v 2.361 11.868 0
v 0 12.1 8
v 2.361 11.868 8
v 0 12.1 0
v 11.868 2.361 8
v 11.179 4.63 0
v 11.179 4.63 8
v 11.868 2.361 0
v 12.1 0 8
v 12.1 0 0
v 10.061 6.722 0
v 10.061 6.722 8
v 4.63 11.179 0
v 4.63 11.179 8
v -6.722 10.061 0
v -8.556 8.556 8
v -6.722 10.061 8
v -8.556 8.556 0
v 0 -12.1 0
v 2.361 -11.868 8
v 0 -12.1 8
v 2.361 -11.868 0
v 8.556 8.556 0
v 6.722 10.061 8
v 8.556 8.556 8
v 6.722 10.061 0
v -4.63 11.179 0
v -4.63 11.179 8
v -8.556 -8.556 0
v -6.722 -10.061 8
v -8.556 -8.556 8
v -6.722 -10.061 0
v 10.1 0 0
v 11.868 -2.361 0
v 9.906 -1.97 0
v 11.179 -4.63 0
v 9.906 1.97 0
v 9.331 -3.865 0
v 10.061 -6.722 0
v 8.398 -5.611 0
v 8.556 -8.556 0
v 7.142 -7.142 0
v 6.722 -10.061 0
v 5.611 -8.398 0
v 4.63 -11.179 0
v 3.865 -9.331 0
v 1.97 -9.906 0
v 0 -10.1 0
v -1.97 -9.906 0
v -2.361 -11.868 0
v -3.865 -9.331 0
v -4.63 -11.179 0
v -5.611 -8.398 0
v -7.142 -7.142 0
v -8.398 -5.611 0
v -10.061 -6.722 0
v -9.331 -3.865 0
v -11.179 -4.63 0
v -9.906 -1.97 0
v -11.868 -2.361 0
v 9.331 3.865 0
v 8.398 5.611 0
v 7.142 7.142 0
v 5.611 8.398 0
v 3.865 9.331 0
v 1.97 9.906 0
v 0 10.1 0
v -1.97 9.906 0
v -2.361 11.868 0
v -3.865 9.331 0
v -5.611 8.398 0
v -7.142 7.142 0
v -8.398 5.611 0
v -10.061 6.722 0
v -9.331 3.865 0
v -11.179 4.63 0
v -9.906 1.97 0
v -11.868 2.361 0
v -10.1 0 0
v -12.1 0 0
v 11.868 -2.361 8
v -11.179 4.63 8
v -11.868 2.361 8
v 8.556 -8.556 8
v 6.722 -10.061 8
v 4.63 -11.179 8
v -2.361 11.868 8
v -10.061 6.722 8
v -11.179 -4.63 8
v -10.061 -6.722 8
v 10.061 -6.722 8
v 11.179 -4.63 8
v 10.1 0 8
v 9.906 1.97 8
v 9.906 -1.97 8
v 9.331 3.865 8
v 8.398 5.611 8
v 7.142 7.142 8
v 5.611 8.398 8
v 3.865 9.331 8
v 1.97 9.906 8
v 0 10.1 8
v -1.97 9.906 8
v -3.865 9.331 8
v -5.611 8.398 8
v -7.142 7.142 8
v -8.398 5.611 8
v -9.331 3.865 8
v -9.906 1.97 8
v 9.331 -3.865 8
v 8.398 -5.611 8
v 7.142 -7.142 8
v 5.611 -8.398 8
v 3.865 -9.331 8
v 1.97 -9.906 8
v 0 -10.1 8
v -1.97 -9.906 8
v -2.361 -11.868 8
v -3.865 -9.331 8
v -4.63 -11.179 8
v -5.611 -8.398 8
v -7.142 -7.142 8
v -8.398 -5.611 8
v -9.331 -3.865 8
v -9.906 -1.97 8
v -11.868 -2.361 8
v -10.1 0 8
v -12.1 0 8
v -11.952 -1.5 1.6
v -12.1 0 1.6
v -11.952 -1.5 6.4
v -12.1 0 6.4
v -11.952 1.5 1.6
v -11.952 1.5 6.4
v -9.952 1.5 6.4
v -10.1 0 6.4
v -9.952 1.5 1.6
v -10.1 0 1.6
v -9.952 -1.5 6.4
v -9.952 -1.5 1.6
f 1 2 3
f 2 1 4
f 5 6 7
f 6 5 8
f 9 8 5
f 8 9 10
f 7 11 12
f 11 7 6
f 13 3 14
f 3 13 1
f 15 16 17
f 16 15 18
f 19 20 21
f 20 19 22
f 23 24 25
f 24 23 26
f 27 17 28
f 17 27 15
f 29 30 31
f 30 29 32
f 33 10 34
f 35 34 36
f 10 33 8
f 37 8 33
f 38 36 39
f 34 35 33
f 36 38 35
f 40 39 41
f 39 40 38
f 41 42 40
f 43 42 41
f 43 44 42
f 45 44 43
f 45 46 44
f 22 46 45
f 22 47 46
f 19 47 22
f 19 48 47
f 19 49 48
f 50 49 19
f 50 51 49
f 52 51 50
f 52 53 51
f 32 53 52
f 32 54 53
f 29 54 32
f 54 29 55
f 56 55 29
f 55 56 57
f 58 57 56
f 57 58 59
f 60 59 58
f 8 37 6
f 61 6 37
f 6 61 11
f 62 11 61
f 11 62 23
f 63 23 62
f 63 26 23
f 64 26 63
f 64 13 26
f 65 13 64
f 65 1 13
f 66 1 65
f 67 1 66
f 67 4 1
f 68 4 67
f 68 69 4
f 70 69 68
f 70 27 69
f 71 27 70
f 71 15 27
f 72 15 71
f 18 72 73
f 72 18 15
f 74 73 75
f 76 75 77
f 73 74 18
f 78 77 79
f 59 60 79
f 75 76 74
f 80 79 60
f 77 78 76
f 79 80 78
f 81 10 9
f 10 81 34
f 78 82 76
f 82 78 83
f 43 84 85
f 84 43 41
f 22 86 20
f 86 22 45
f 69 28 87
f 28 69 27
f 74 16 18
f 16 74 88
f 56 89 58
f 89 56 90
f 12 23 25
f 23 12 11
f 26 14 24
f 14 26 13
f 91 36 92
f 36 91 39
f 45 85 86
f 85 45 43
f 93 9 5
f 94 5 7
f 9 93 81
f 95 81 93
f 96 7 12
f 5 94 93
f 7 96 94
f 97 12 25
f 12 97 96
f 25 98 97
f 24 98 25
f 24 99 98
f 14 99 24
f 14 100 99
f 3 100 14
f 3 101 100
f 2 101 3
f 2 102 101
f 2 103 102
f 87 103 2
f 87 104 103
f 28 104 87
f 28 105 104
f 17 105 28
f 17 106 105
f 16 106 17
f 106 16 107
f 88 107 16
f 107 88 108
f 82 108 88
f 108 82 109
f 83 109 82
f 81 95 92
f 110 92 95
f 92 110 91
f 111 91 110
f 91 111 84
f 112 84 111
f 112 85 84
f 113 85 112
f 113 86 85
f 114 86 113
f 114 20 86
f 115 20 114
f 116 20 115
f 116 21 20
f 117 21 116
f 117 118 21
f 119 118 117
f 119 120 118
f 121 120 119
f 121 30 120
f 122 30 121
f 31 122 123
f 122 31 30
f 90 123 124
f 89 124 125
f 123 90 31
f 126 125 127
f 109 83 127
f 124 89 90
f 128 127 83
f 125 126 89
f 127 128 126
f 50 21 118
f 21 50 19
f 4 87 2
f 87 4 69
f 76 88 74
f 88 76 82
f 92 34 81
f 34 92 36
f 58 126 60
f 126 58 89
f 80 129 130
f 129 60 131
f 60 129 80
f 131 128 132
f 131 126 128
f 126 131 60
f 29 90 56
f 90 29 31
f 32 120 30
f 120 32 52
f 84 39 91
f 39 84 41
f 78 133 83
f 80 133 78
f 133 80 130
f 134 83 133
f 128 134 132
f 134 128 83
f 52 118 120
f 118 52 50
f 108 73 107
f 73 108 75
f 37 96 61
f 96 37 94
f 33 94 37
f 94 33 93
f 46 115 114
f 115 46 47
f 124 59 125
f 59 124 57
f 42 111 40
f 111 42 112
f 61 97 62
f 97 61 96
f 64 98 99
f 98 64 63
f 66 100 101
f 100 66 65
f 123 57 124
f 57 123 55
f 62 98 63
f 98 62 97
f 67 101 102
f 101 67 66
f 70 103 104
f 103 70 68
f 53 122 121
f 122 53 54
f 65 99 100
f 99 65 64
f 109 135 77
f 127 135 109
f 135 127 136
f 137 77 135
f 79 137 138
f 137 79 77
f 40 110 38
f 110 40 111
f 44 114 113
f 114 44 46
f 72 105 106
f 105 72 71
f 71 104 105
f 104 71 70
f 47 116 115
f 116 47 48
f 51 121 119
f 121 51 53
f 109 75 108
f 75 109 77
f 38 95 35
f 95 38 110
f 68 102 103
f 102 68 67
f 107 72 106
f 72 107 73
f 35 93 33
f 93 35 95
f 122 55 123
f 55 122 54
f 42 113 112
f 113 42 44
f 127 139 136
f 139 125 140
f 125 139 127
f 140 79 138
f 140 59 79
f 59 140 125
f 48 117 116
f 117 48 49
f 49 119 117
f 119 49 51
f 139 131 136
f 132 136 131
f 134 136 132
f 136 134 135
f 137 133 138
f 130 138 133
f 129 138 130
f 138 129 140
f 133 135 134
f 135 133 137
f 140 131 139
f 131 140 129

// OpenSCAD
$fn = 32;

// ----------------------------------------------------------------------
// Spacer sleeve: 24.2 / 20.2 x 8 mm
// ----------------------------------------------------------------------

// --- parameters (mm) ---
outer_d = 24.2;           // outside diameter
inner_d = 20.2;           // shaft bore
length = 8;               // sleeve length
slot_w = 3;               // clamp slot width
slot_len = 4.8;           // clamp slot length

module sleeve() {
  cylinder(h = length, d = outer_d);
}

difference() {
  sleeve();
  translate([0, 0, -1]) cylinder(h = length + 2, d = inner_d);
  translate([-outer_d / 2 - 1, -slot_w / 2, length / 2 - slot_len / 2]) cube([outer_d / 2 + 1, slot_w, slot_len]);
}
